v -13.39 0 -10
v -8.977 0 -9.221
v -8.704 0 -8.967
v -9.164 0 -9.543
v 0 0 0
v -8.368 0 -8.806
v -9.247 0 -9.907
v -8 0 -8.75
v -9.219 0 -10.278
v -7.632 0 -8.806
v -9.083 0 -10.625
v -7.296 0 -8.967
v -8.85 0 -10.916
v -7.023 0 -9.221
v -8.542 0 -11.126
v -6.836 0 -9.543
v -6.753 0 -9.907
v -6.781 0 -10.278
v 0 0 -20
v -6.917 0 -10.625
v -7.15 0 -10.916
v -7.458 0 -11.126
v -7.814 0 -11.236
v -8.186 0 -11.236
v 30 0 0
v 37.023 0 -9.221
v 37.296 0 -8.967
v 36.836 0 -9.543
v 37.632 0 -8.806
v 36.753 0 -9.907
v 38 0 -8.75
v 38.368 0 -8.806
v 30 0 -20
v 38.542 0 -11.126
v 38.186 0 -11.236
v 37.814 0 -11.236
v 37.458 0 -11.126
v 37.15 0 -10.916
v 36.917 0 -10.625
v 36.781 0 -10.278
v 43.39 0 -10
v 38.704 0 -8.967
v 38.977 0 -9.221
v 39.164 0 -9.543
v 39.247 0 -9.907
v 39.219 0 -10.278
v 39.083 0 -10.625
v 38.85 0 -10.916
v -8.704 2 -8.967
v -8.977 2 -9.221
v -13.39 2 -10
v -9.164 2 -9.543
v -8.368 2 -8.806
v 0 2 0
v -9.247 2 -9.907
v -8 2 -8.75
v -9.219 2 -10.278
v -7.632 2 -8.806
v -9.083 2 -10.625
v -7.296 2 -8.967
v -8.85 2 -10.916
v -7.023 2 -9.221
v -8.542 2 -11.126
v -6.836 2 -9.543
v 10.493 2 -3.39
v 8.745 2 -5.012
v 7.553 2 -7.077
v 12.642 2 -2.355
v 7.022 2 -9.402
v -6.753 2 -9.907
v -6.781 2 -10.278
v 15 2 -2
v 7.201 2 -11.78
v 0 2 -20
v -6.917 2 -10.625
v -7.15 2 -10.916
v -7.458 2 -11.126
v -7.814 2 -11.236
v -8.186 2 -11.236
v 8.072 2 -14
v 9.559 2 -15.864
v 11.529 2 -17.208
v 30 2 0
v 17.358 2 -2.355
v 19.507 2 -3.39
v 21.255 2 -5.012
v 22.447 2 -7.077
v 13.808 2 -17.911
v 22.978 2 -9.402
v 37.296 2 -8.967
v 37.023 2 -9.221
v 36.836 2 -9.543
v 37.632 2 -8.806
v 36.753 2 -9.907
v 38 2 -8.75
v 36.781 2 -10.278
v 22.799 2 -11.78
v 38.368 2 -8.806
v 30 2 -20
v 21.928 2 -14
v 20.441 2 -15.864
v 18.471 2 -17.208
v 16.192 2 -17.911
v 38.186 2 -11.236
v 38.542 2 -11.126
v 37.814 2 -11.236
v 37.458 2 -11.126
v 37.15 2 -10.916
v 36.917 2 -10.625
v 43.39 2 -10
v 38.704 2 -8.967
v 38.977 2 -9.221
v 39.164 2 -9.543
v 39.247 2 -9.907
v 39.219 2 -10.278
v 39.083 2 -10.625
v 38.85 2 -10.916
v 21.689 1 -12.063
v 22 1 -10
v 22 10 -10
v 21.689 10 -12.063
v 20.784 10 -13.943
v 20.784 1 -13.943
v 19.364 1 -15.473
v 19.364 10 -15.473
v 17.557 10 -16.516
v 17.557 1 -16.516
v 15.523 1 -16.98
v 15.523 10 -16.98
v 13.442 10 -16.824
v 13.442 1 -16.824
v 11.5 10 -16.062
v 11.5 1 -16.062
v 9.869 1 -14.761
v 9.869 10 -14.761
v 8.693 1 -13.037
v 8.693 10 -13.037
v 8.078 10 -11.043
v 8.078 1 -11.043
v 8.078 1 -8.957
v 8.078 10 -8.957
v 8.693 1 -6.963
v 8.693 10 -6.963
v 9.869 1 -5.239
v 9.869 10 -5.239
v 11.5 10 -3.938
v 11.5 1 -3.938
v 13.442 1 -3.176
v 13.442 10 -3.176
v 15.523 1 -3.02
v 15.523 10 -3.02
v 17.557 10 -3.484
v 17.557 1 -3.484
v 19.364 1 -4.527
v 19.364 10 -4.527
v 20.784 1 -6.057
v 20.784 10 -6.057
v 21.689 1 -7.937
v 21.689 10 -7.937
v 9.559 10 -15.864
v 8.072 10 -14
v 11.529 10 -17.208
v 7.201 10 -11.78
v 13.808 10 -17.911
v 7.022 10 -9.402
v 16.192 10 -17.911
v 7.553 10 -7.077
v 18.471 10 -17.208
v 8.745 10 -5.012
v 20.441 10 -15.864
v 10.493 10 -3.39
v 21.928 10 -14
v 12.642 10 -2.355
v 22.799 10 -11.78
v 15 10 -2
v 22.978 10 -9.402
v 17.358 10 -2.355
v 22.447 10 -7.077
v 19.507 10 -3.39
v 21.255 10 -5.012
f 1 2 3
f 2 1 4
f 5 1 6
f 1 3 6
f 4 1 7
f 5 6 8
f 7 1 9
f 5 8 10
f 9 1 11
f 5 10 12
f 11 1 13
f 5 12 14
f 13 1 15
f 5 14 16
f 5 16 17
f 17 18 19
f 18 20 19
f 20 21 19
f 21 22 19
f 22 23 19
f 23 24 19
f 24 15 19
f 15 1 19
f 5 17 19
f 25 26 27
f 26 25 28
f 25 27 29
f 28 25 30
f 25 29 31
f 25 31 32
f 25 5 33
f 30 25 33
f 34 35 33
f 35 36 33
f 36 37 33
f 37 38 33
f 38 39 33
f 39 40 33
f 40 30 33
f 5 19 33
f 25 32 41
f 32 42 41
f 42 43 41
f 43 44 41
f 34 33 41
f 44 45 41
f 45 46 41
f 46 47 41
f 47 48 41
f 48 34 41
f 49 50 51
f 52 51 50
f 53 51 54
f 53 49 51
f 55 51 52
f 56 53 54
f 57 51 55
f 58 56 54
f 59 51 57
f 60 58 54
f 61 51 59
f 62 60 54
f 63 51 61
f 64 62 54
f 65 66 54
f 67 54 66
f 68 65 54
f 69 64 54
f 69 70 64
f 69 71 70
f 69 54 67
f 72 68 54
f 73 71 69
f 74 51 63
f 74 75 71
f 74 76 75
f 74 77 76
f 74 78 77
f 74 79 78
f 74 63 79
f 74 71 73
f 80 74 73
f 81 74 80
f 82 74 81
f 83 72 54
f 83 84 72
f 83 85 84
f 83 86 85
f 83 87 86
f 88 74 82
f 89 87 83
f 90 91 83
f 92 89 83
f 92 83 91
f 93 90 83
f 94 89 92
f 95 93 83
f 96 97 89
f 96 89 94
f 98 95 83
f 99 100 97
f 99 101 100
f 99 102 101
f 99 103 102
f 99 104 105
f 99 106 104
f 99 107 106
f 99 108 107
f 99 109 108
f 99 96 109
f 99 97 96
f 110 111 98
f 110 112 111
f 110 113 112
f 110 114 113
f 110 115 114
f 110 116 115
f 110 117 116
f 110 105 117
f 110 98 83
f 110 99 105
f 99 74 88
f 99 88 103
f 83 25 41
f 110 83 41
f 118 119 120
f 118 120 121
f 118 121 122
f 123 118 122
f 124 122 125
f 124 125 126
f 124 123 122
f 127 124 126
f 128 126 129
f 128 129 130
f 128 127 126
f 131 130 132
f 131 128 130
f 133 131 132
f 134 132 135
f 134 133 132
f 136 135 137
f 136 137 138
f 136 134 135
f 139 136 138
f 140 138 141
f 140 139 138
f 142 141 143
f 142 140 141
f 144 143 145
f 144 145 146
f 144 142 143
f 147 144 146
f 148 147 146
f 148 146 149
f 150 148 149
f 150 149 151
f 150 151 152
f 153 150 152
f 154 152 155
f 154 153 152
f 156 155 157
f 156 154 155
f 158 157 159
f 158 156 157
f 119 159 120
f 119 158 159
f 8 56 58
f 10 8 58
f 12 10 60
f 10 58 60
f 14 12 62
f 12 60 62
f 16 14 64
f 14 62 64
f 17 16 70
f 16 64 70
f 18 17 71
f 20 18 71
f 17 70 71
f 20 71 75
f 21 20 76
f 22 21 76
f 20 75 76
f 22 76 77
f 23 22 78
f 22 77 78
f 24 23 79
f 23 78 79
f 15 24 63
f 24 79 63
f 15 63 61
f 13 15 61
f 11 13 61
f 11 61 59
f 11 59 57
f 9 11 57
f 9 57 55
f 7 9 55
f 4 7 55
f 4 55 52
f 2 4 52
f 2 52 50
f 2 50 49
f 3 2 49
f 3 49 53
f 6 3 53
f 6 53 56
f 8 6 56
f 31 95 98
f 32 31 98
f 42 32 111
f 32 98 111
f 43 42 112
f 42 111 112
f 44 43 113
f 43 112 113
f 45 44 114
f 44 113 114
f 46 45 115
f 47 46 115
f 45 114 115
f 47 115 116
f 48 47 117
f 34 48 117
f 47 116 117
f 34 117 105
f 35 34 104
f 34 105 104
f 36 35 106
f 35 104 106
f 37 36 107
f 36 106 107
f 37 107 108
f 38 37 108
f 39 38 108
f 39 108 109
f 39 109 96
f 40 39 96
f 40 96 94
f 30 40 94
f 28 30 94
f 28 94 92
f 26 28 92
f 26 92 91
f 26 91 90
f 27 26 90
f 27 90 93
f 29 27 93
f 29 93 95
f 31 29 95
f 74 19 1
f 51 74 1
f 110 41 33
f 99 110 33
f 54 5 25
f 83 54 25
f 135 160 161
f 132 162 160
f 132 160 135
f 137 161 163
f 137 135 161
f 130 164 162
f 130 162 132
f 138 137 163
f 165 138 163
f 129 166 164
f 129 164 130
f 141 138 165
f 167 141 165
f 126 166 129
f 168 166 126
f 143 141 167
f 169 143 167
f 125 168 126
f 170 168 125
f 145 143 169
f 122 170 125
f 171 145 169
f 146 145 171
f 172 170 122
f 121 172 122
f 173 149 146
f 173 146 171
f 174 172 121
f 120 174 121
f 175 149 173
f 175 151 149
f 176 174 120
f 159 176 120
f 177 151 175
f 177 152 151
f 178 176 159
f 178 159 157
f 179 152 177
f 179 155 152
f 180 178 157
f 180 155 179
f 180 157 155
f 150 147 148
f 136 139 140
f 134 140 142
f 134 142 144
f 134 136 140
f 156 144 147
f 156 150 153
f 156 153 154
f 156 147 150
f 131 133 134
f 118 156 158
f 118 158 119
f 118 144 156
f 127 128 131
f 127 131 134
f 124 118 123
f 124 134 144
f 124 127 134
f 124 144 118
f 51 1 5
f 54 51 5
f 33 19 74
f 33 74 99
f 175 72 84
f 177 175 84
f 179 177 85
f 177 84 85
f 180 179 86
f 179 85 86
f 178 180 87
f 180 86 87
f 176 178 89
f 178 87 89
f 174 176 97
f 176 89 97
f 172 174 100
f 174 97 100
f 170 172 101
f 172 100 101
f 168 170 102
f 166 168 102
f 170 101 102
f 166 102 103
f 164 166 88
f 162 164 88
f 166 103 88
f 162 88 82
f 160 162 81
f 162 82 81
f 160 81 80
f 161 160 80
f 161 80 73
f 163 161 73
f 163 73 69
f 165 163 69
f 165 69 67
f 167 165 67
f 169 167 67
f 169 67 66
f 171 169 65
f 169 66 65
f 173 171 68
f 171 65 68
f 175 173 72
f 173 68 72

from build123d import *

# Parameters (mm, degrees)
SKETCH1_W           = 30
SKETCH1_H           = 20
BOSS_EXTRUDE1_DEPTH = 2
SKETCH4_R           = 8
BOSS_EXTRUDE2_DEPTH = 8
SHELL1_START        = 1
SHELL1_OUTLINE_R    = 7
SHELL1_DEPTH        = 9
SKETCH5_R           = 1.25
CUT_EXTRUDE1_DEPTH  = 8
SKETCH6_R           = 1.25
CUT_EXTRUDE2_DEPTH  = 8


# Read off the part's stored shape, not the designer's step: Shell1
with BuildPart() as part:
    # Sketch1 → Boss-Extrude1 (new body)
    with BuildSketch(Plane(origin=(0, 0, 0), x_dir=(1, 0, 0), z_dir=(0, 1, 0))):
        Polygon((30, 0), (43.389820148, 10), (30, 20), align=None)
        Polygon((0, 20), (-13.389820148, 10), (0, 0), align=None)
        with Locations((15, 10)):
            Rectangle(SKETCH1_W, SKETCH1_H)
    extrude(amount=BOSS_EXTRUDE1_DEPTH)

    # Sketch4 → Boss-Extrude2 (add)
    with BuildSketch(Plane(origin=(0, 2, 0), x_dir=(1, 0, 0), z_dir=(0, 1, 0))):
        with Locations(Location((15, 10, 0), (0, 0, 270))):
            Circle(SKETCH4_R)
    extrude(amount=BOSS_EXTRUDE2_DEPTH)

    # Shell1 outline → Shell1 (cut)
    with BuildSketch(Plane(origin=(0, 0, 0), x_dir=(1, 0, 0), z_dir=(0, 1, 0)).offset(SHELL1_START)):
        with Locations((15, 10)):
            Circle(SHELL1_OUTLINE_R)
    extrude(amount=SHELL1_DEPTH, mode=Mode.SUBTRACT)

    # Sketch5 → Cut-Extrude1 (cut)
    with BuildSketch(Plane(origin=(0, 2, 0), x_dir=(1, 0, 0), z_dir=(0, 1, 0))):
        with Locations(Location((-8, 10, 0), (0, 0, 270))):
            Circle(SKETCH5_R)
    extrude(amount=-CUT_EXTRUDE1_DEPTH, mode=Mode.SUBTRACT)

    # Sketch6 → Cut-Extrude2 (cut)
    with BuildSketch(Plane(origin=(0, 2, 0), x_dir=(1, 0, 0), z_dir=(0, 1, 0))):
        with Locations(Location((38, 10, 0), (0, 0, 270))):
            Circle(SKETCH6_R)
    extrude(amount=-CUT_EXTRUDE2_DEPTH, mode=Mode.SUBTRACT)


solid = part.part
